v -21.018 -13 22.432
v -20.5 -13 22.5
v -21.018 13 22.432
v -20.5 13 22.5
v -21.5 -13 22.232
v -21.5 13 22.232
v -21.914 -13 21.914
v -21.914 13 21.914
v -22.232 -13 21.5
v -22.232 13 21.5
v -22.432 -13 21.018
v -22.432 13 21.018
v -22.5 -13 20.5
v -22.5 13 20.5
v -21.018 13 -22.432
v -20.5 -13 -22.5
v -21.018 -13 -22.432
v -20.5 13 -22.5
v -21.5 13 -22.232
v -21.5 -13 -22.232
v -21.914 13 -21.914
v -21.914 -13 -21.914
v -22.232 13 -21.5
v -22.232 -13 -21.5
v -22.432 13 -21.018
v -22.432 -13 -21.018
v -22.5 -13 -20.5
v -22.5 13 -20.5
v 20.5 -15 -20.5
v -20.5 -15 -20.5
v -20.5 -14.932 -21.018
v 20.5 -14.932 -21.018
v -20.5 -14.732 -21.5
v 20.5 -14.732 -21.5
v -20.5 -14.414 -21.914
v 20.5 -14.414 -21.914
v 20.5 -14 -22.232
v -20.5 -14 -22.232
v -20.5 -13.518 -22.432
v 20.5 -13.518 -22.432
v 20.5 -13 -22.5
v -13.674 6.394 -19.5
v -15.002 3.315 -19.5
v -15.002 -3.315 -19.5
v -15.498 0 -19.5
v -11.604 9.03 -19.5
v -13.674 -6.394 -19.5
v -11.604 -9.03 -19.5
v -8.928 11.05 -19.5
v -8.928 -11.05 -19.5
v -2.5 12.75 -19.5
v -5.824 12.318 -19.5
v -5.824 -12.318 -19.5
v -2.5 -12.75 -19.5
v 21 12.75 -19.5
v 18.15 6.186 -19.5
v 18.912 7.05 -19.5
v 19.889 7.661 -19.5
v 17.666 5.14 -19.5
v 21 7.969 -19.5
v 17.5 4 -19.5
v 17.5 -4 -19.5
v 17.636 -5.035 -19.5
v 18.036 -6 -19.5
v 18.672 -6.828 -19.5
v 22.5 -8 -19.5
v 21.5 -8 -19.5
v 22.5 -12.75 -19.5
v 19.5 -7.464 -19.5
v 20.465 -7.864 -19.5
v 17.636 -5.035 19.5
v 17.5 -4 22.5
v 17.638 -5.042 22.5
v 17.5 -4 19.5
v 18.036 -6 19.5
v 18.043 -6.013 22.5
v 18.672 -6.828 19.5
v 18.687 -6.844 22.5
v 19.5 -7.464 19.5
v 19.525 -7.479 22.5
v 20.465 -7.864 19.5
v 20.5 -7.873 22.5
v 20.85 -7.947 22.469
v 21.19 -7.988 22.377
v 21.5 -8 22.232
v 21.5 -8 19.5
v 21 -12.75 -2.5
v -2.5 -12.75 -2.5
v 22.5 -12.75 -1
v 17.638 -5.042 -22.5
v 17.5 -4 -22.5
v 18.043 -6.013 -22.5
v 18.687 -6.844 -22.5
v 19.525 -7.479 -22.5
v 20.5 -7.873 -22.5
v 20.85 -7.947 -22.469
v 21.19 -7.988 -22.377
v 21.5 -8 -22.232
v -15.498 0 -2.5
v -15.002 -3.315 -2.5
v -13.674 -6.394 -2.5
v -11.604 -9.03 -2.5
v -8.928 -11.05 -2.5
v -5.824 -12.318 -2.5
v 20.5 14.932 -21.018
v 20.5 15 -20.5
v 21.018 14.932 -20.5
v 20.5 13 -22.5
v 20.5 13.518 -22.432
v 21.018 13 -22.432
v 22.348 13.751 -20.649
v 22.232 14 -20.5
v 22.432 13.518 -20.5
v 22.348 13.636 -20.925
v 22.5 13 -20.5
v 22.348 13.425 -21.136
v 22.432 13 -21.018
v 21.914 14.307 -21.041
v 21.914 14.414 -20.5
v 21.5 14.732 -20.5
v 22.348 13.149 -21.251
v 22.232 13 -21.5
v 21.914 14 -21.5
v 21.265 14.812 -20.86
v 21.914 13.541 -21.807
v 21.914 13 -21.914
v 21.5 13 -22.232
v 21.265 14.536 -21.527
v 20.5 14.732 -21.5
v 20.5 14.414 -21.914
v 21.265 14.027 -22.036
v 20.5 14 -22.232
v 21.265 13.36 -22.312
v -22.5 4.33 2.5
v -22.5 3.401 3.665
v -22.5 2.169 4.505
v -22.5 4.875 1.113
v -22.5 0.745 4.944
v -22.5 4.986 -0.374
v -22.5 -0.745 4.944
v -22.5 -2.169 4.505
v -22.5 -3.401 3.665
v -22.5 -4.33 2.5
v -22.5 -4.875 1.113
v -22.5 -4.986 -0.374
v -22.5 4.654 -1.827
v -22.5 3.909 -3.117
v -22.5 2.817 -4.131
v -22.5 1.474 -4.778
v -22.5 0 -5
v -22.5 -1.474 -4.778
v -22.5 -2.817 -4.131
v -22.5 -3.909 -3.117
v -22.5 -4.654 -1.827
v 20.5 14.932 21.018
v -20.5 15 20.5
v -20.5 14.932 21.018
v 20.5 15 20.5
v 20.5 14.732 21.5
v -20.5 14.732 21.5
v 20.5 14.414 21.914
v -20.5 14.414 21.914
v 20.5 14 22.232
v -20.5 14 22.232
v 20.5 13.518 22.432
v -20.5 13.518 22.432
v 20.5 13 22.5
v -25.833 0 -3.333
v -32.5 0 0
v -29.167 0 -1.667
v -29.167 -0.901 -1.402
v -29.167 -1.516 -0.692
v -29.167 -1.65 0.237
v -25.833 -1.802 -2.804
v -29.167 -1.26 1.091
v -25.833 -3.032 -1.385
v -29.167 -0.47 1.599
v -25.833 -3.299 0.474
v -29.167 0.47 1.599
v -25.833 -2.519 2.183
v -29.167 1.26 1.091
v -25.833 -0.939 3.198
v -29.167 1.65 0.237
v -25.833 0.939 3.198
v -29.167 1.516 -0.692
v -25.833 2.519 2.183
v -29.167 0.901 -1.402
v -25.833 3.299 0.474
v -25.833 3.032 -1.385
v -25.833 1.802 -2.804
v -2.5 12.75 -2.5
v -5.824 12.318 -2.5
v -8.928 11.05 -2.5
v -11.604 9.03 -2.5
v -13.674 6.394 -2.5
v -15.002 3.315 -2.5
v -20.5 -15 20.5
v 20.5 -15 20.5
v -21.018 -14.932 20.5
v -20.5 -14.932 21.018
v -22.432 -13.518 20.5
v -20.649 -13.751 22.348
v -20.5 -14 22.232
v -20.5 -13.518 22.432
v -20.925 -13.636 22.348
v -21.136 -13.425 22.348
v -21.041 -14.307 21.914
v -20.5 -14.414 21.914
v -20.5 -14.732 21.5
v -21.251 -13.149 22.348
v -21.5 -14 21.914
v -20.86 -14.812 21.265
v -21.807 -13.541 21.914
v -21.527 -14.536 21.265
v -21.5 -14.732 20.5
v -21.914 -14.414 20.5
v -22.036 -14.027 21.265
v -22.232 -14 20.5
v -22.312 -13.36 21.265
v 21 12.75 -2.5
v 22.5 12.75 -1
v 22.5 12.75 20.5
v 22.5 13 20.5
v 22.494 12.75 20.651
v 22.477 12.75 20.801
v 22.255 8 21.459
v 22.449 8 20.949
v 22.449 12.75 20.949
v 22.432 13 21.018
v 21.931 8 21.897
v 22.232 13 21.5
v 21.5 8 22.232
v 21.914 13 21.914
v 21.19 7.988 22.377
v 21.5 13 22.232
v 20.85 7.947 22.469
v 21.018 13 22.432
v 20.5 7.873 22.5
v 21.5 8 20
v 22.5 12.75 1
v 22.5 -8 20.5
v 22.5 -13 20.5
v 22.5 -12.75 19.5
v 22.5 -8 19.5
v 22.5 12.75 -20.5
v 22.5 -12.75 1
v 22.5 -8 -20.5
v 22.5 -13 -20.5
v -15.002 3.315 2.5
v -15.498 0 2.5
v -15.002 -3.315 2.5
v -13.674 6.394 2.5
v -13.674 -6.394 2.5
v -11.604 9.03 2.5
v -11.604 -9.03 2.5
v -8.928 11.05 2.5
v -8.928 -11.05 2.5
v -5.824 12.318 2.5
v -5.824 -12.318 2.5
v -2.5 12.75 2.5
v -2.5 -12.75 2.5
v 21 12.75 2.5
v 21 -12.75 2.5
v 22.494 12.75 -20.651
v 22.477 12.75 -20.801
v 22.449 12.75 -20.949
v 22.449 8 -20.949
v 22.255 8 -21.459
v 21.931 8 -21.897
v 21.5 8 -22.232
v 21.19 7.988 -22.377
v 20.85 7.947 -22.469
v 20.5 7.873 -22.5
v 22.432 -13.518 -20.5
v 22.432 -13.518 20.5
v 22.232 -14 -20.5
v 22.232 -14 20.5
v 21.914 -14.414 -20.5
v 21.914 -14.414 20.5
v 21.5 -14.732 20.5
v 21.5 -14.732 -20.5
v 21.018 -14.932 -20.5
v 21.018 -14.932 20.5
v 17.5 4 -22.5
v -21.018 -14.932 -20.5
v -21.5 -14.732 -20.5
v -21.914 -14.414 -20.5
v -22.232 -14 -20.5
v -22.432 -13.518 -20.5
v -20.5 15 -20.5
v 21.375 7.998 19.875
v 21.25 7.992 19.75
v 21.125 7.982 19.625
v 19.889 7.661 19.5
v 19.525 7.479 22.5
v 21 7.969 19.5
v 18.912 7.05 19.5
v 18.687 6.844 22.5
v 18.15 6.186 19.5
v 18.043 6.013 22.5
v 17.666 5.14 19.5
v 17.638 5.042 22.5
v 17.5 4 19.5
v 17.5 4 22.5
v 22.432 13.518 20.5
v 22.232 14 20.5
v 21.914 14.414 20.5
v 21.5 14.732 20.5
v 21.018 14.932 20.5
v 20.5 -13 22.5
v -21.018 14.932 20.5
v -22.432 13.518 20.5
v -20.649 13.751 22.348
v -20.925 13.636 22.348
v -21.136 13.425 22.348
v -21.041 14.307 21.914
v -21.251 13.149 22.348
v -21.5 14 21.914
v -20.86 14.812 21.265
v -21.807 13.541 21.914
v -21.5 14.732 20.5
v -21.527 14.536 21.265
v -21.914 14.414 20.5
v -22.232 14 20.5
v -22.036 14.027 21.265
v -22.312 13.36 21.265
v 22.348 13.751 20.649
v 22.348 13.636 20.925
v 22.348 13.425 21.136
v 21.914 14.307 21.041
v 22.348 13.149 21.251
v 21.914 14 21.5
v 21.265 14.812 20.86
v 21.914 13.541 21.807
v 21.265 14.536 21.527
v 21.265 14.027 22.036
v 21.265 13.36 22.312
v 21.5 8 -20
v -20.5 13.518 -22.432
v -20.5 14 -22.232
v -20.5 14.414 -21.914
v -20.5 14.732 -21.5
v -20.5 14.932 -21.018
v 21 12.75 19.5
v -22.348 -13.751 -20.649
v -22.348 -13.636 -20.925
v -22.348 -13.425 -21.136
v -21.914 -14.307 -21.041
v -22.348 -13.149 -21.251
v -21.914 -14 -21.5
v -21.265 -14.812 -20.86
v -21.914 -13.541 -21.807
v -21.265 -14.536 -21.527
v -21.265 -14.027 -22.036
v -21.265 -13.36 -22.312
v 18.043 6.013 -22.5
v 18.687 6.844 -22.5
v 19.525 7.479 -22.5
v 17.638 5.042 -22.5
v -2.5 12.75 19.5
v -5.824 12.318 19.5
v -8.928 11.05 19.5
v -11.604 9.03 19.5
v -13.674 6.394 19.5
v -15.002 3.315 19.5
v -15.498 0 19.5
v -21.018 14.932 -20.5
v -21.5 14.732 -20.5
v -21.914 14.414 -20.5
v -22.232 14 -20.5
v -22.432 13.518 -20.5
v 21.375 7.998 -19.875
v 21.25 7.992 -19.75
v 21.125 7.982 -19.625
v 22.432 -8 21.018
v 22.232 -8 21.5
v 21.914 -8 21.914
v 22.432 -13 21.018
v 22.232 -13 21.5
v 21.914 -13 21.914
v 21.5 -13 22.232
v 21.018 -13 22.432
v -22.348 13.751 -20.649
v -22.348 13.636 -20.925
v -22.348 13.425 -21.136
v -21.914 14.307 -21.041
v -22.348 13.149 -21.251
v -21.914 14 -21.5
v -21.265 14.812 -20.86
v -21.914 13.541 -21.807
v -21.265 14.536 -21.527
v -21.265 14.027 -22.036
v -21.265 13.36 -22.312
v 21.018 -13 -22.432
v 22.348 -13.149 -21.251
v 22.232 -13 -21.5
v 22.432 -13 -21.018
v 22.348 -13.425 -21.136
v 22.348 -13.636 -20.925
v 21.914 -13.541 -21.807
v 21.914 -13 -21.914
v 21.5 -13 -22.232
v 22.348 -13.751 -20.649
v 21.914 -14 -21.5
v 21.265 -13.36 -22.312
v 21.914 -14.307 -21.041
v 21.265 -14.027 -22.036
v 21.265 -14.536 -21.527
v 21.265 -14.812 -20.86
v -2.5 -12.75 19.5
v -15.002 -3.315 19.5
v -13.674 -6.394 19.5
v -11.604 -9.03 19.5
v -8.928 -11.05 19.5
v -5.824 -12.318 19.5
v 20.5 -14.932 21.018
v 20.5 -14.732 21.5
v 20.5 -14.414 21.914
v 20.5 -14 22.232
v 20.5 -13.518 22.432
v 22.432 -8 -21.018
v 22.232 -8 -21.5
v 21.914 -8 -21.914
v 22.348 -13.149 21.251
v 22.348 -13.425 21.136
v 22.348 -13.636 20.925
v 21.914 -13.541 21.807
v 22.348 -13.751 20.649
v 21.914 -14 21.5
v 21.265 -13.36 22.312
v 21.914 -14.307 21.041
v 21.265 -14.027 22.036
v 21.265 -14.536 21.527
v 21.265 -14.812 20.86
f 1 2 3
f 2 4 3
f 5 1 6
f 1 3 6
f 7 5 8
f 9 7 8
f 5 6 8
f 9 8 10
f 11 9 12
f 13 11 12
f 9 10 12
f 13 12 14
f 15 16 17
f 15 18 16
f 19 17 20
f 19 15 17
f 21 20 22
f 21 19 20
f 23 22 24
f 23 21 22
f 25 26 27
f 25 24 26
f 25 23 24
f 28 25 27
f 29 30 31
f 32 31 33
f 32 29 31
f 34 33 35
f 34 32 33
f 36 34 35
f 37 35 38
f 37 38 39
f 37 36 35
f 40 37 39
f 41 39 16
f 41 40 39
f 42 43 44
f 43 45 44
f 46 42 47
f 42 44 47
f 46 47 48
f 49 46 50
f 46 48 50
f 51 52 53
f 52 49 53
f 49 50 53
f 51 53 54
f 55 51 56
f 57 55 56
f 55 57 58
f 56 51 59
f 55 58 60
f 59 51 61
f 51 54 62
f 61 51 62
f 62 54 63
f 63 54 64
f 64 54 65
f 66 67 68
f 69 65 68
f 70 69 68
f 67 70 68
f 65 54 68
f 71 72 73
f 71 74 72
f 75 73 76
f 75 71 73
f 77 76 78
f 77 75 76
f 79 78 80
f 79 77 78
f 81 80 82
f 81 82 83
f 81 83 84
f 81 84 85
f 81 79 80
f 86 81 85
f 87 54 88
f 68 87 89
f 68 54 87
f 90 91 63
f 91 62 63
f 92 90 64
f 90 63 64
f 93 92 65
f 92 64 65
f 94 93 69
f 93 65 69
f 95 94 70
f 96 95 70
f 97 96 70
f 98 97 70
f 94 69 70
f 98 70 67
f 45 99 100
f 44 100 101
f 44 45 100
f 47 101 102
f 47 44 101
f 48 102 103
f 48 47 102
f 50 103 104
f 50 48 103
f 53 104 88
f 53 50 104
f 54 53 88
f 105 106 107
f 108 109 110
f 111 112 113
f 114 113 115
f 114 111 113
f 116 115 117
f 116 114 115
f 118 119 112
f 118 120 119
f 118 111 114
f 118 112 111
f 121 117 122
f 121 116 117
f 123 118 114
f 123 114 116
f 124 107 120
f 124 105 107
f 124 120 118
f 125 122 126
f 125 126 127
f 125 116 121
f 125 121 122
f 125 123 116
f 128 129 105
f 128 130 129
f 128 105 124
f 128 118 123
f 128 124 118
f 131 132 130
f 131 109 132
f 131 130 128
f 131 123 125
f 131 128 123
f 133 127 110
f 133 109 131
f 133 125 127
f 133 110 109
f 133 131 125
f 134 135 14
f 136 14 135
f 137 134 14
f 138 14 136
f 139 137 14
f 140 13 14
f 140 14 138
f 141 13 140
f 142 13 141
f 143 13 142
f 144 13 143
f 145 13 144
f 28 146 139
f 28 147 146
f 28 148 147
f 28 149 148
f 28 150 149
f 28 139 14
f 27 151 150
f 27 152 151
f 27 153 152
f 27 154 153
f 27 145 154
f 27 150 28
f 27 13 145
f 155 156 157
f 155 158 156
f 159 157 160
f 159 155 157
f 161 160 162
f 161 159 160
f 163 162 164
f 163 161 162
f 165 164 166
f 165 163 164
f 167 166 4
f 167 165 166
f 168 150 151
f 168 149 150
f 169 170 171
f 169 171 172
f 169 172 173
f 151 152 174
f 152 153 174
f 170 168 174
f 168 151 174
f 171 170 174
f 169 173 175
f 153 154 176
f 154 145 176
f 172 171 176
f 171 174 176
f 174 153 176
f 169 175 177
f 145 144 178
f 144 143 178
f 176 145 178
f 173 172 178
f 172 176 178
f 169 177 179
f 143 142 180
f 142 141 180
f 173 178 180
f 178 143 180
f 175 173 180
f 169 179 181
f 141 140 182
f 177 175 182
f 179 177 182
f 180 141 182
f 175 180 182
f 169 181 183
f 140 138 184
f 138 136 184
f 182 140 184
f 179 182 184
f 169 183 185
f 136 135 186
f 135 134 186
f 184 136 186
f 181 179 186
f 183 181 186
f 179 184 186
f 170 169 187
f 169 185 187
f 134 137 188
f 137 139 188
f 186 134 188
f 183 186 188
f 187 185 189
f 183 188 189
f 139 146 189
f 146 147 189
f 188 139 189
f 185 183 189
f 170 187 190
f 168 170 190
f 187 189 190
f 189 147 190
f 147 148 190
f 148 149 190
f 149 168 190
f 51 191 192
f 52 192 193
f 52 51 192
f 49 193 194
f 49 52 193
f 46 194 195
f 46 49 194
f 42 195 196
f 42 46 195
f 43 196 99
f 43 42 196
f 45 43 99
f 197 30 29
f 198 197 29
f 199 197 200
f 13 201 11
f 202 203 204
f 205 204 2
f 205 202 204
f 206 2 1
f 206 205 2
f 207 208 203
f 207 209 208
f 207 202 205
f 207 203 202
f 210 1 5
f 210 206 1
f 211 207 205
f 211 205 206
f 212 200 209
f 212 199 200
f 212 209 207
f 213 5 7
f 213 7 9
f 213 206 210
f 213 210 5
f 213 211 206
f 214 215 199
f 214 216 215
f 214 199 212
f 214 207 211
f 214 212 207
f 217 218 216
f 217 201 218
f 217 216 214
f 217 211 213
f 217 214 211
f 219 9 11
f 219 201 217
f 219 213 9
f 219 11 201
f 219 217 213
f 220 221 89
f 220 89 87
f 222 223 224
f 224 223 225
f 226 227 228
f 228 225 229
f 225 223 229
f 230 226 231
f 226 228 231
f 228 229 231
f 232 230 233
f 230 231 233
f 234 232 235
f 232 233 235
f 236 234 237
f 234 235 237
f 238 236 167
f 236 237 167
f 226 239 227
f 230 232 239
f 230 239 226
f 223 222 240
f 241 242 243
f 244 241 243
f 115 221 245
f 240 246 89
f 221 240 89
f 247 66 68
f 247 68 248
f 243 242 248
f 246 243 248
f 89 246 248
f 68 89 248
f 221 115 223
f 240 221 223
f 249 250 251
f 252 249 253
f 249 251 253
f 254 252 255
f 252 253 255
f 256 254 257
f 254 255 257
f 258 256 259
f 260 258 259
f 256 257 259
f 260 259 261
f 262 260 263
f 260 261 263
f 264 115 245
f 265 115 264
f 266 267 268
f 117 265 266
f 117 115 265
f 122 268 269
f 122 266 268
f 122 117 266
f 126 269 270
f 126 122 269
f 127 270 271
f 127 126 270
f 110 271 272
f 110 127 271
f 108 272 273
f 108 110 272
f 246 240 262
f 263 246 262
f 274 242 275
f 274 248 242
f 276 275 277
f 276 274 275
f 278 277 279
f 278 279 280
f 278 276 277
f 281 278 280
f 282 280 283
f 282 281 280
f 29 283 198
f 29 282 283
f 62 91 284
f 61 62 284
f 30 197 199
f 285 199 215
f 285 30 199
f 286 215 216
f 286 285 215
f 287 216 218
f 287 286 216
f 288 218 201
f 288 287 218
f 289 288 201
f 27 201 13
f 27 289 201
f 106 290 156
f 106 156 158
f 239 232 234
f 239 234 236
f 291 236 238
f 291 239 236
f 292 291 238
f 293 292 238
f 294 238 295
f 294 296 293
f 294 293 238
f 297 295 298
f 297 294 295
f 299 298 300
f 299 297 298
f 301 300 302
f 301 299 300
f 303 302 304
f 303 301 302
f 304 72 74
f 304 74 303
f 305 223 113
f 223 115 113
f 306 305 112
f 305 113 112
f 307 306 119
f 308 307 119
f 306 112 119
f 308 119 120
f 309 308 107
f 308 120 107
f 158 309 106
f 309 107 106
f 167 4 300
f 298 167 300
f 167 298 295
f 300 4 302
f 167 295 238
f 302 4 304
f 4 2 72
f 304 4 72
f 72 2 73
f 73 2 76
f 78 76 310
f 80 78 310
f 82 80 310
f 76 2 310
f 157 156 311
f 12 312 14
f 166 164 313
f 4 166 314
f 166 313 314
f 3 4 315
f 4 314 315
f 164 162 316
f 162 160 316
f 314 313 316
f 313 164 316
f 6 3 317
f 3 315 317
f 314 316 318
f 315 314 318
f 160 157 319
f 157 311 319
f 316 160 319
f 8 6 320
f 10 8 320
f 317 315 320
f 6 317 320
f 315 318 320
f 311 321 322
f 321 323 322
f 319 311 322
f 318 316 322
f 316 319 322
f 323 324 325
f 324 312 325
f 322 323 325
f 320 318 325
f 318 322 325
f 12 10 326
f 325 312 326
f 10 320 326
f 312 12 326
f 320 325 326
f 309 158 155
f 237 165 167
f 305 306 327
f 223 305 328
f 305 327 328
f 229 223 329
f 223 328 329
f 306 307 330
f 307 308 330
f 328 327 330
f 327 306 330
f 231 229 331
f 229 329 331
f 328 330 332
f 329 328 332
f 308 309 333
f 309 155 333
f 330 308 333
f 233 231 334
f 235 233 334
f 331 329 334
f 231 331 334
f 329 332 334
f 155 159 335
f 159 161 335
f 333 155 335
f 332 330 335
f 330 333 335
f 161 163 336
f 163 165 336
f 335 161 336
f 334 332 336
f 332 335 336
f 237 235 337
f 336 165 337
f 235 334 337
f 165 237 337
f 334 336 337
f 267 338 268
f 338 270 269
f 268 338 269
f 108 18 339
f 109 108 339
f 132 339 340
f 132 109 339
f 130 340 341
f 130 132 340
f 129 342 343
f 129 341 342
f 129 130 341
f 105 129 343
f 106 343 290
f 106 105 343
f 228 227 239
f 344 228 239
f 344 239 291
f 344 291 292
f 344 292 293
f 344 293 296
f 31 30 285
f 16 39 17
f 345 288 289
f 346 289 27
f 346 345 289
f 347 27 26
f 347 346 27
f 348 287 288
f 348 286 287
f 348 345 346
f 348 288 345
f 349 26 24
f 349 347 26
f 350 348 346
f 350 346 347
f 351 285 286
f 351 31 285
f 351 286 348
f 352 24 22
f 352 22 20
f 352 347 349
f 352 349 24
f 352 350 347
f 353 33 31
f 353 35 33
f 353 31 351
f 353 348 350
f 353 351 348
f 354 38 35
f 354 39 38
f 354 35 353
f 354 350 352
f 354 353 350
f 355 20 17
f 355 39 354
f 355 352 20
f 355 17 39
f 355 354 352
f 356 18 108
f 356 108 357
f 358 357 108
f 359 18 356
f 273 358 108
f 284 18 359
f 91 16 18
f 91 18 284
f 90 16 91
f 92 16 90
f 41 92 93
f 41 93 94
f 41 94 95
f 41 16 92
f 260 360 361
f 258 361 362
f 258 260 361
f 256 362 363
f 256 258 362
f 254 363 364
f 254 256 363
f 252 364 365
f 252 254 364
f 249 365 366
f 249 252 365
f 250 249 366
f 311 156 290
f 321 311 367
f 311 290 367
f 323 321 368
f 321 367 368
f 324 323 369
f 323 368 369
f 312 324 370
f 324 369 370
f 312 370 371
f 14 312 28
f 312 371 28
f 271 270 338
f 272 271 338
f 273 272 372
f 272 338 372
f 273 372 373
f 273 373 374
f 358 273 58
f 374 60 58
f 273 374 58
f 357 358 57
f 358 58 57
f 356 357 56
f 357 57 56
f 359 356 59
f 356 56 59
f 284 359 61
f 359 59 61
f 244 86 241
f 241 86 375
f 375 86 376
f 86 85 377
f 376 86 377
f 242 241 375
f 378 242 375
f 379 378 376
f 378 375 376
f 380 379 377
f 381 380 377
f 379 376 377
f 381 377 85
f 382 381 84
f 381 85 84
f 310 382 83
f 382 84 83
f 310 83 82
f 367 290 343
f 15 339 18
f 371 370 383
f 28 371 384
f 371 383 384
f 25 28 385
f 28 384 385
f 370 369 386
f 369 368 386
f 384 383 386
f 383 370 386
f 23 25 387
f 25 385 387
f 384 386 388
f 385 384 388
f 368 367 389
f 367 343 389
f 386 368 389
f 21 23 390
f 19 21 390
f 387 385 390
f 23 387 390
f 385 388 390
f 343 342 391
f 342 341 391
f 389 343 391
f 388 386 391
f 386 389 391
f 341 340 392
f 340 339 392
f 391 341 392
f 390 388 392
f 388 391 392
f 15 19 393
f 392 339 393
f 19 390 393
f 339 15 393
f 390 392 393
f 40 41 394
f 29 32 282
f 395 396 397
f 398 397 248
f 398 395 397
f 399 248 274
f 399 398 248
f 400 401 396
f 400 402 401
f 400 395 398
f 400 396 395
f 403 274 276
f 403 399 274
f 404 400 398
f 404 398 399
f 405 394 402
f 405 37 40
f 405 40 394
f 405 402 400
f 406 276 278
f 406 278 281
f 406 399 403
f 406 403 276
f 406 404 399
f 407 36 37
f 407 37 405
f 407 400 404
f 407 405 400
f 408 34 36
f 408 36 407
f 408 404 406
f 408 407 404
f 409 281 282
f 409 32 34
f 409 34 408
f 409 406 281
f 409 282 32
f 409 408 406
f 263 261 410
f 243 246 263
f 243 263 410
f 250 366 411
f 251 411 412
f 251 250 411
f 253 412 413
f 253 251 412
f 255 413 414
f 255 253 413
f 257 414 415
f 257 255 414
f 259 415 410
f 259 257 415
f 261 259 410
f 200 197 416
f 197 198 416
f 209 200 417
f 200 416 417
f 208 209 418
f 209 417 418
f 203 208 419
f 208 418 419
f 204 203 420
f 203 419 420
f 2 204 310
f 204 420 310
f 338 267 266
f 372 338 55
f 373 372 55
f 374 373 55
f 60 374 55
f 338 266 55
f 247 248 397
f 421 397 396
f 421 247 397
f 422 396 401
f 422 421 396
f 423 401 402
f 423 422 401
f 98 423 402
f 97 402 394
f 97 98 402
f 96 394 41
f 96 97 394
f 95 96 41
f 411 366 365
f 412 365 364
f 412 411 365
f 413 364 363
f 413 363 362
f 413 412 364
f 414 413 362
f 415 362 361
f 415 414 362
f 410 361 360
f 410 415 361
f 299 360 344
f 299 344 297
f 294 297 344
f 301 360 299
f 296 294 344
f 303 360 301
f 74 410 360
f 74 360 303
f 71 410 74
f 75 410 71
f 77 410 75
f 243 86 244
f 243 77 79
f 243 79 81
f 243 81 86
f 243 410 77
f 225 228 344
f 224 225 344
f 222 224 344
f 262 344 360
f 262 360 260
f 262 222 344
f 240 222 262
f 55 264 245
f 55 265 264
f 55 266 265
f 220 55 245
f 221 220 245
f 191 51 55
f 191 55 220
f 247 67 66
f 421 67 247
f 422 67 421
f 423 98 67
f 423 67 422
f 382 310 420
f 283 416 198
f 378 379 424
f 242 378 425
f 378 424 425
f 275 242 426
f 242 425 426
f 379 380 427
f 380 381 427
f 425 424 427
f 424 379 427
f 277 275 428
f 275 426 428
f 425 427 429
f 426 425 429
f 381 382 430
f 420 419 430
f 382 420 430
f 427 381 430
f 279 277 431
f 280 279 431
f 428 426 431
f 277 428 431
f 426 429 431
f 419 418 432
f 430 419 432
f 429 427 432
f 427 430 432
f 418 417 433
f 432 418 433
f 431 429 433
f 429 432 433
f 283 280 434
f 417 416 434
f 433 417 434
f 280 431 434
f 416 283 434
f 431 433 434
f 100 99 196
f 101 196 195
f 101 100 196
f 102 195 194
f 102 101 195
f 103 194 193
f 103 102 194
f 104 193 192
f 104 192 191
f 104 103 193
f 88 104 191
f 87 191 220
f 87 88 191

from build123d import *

# Parameters (mm, degrees)
BOSS_EXTRUDE1_DEPTH      = 15
BOSS_EXTRUDE1_DEPTH_BACK = 15
SKETCH1_W                = 45
SKETCH1_H                = 45
CUT_EXTRUDE1_DEPTH       = 12.75
CUT_EXTRUDE1_DEPTH_BACK  = 12.75
SKETCH2_W                = 38
SKETCH2_H                = 17
FILLET1_R                = 13
CUT_EXTRUDE2_REACH       = 54.5
SKETCH5_W                = 5
SKETCH5_H                = 16
FILLET2_R                = 2
CHAMFER3_SIZE            = 1.5
FILLET3_R                = 4


with BuildPart() as part:
    # Sketch1 → Boss-Extrude1 (new, two sides: drawn at the far end of the back side and taken through both)
    with BuildSketch(Plane(origin=(0, 0, 0), x_dir=(1, 0, 0), z_dir=(0, 1, 0)).offset(-BOSS_EXTRUDE1_DEPTH_BACK)):
        Rectangle(SKETCH1_W, SKETCH1_H)
    extrude(amount=BOSS_EXTRUDE1_DEPTH + BOSS_EXTRUDE1_DEPTH_BACK)

    # Sketch2 → Cut-Extrude1 (cut, two sides: drawn at the far end of the back side and taken through both)
    with BuildSketch(Plane(origin=(0, 0, 0), x_dir=(1, 0, 0), z_dir=(0, 1, 0)).offset(-CUT_EXTRUDE1_DEPTH_BACK)):
        with Locations((3.5, 11)):
            Rectangle(SKETCH2_W, SKETCH2_H)
        with Locations((3.5, -11)):
            Rectangle(SKETCH2_W, SKETCH2_H)
    extrude(amount=CUT_EXTRUDE1_DEPTH + CUT_EXTRUDE1_DEPTH_BACK, mode=Mode.SUBTRACT)

    # Fillet1
    # the kernel refuses this fillet: 13 mm, written as the material it adds along each edge
    with BuildSketch(Plane(origin=(-15.5, -12.75, -19.5), x_dir=(1, 0, 0), z_dir=(0, 0, 1))) as fillet1_piece_1_section:
        with BuildLine():
            CenterArc((FILLET1_R, FILLET1_R), FILLET1_R, 180, 90)
            Line((0, FILLET1_R), (0, 0))
            Line((0, 0), (FILLET1_R, 0))
        make_face()
    fillet1_piece_1 = extrude(amount=49.5, mode=Mode.PRIVATE)
    fillet1_piece_1 = split(fillet1_piece_1, bisect_by=Plane(origin=(-12.596216794, -9.846216794, 19.5), z_dir=(0, 0, -1)), keep=Keep.TOP, mode=Mode.PRIVATE)
    add(fillet1_piece_1)
    with BuildSketch(Plane(origin=(-15.5, 12.75, -19.5), x_dir=(1, 0, 0), z_dir=(0, 0, 1))) as fillet1_piece_2_section:
        with BuildLine():
            CenterArc((FILLET1_R, -FILLET1_R), FILLET1_R, 90, 90)
            Line((0, -FILLET1_R), (0, 0))
            Line((0, 0), (FILLET1_R, 0))
        make_face()
    fillet1_piece_2 = extrude(amount=49.5, mode=Mode.PRIVATE)
    fillet1_piece_2 = split(fillet1_piece_2, bisect_by=Plane(origin=(-12.596216794, 9.846216794, 19.5), z_dir=(0, 0, -1)), keep=Keep.TOP, mode=Mode.PRIVATE)
    add(fillet1_piece_2)
    with BuildSketch(Plane(origin=(-15.5, 12.75, 19.5), x_dir=(1, 0, 0), z_dir=(0, 0, -1))) as fillet1_piece_3_section:
        with BuildLine():
            CenterArc((FILLET1_R, FILLET1_R), FILLET1_R, 180, 90)
            Line((0, FILLET1_R), (0, 0))
            Line((0, 0), (FILLET1_R, 0))
        make_face()
    fillet1_piece_3 = extrude(amount=49.5, mode=Mode.PRIVATE)
    fillet1_piece_3 = split(fillet1_piece_3, bisect_by=Plane(origin=(-12.596216794, 9.846216794, -19.5), z_dir=(0, 0, 1)), keep=Keep.TOP, mode=Mode.PRIVATE)
    add(fillet1_piece_3)
    with BuildSketch(Plane(origin=(-15.5, -12.75, 19.5), x_dir=(1, 0, 0), z_dir=(0, 0, -1))) as fillet1_piece_4_section:
        with BuildLine():
            CenterArc((FILLET1_R, -FILLET1_R), FILLET1_R, 90, 90)
            Line((0, -FILLET1_R), (0, 0))
            Line((0, 0), (FILLET1_R, 0))
        make_face()
    fillet1_piece_4 = extrude(amount=49.5, mode=Mode.PRIVATE)
    fillet1_piece_4 = split(fillet1_piece_4, bisect_by=Plane(origin=(-12.596216794, -9.846216794, -19.5), z_dir=(0, 0, 1)), keep=Keep.TOP, mode=Mode.PRIVATE)
    add(fillet1_piece_4)

    # Sketch5 → Cut-Extrude2 (cut, up to next)
    with BuildSketch(Plane.XY.offset(22.5), mode=Mode.PRIVATE) as cut_extrude2_sk1:
        with Locations((20, 0)):
            Rectangle(SKETCH5_W, SKETCH5_H)
    cut_extrude2_tool1 = extrude(cut_extrude2_sk1.sketch, amount=-CUT_EXTRUDE2_REACH, mode=Mode.PRIVATE) & part.part
    cut_extrude2 = cut_extrude2_tool1.solids().sort_by_distance((20, 0, 22.5))[0]
    add(cut_extrude2, mode=Mode.SUBTRACT)

    # Mirror1: Cut-Extrude2 across plane
    add(cut_extrude2.mirror(Plane.XY), mode=Mode.SUBTRACT)

    # Fillet2
    fillet2_edges = [part.edges().sort_by_distance(p)[0] for p in [
        (0, 15, -22.5),
        (-22.5, 15, 0),
        (0, 15, 22.5),
        (0, -15, -22.5),
        (22.5, 15, 0),
        (-22.5, -15, 0),
        (0, -15, 22.5),
        (22.5, 11.5, 22.5),
        (-22.5, 0, 22.5),
        (-22.5, 0, -22.5),
        (22.5, -11.5, -22.5),
        (22.5, -11.5, 22.5),
        (22.5, 11.5, -22.5),
        (22.5, -15, 0),
    ]]
    fillet(fillet2_edges, radius=FILLET2_R)

    # Sketch3 → Revolve1 (revolve)
    with BuildSketch(Plane(origin=(0, 0, 0), x_dir=(1, 0, 0), z_dir=(0, 1, 0))):
        Polygon((-22.5, 0), (-32.5, 0), (-22.5, 5), align=None)
    revolve(axis=Axis((-22.5, 0, 0), (-1, 0, 0)))

    # Chamfer3
    # the kernel refuses this chamfer: 1.5 mm, written as the material it takes off along each edge
    with BuildSketch(Plane(origin=(22.5, 12.75, -19.5), x_dir=(0.0274958766105867, 0, -0.9996219169112968), z_dir=(0, -1, 0)), Plane(origin=(22.5, 4.142475518, 19.5), x_dir=(0.027495876610586768, 0, 0.9996219169112968), z_dir=(0, 1, 0))) as chamfer3_piece_1:
        Polygon((CHAMFER3_SIZE * 0.999621916911, -CHAMFER3_SIZE * 0.0274958766106), (-CHAMFER3_SIZE * 0.0274958766106, -CHAMFER3_SIZE * 0.999621916911), (0, 0), align=None)
    extrude(amount=8.607524482, mode=Mode.SUBTRACT)
    with BuildSketch(Plane(origin=(22.5, 12.75, -2.5), x_dir=(0.027495876610577594, 0, 0.999621916911297), z_dir=(0, -1, 0))) as chamfer3_piece_2:
        Polygon((CHAMFER3_SIZE * 0.999621916911, CHAMFER3_SIZE * 0.0274958766106), (-CHAMFER3_SIZE * 0.0274958766106, CHAMFER3_SIZE * 0.999621916911), (0, 0), align=None)
    extrude(amount=25.5, mode=Mode.SUBTRACT)
    with BuildSketch(Plane(origin=(22.5, 12.75, 2.5), x_dir=(0.027495876610577594, 0, -0.999621916911297), z_dir=(0, -1, 0))) as chamfer3_piece_3:
        Polygon((CHAMFER3_SIZE * 0.999621916911, -CHAMFER3_SIZE * 0.0274958766106), (-CHAMFER3_SIZE * 0.0274958766106, -CHAMFER3_SIZE * 0.999621916911), (0, 0), align=None)
    extrude(amount=25.5, mode=Mode.SUBTRACT)

    # Fillet3
    fillet3_edges = [part.edges().sort_by_distance(p)[0] for p in [
        (17.5, -8, -21),
        (17.5, 8, -21),
        (17.5, -8, 21),
        (17.5, 8, 21),
    ]]
    fillet(fillet3_edges, radius=FILLET3_R)


solid = part.part
